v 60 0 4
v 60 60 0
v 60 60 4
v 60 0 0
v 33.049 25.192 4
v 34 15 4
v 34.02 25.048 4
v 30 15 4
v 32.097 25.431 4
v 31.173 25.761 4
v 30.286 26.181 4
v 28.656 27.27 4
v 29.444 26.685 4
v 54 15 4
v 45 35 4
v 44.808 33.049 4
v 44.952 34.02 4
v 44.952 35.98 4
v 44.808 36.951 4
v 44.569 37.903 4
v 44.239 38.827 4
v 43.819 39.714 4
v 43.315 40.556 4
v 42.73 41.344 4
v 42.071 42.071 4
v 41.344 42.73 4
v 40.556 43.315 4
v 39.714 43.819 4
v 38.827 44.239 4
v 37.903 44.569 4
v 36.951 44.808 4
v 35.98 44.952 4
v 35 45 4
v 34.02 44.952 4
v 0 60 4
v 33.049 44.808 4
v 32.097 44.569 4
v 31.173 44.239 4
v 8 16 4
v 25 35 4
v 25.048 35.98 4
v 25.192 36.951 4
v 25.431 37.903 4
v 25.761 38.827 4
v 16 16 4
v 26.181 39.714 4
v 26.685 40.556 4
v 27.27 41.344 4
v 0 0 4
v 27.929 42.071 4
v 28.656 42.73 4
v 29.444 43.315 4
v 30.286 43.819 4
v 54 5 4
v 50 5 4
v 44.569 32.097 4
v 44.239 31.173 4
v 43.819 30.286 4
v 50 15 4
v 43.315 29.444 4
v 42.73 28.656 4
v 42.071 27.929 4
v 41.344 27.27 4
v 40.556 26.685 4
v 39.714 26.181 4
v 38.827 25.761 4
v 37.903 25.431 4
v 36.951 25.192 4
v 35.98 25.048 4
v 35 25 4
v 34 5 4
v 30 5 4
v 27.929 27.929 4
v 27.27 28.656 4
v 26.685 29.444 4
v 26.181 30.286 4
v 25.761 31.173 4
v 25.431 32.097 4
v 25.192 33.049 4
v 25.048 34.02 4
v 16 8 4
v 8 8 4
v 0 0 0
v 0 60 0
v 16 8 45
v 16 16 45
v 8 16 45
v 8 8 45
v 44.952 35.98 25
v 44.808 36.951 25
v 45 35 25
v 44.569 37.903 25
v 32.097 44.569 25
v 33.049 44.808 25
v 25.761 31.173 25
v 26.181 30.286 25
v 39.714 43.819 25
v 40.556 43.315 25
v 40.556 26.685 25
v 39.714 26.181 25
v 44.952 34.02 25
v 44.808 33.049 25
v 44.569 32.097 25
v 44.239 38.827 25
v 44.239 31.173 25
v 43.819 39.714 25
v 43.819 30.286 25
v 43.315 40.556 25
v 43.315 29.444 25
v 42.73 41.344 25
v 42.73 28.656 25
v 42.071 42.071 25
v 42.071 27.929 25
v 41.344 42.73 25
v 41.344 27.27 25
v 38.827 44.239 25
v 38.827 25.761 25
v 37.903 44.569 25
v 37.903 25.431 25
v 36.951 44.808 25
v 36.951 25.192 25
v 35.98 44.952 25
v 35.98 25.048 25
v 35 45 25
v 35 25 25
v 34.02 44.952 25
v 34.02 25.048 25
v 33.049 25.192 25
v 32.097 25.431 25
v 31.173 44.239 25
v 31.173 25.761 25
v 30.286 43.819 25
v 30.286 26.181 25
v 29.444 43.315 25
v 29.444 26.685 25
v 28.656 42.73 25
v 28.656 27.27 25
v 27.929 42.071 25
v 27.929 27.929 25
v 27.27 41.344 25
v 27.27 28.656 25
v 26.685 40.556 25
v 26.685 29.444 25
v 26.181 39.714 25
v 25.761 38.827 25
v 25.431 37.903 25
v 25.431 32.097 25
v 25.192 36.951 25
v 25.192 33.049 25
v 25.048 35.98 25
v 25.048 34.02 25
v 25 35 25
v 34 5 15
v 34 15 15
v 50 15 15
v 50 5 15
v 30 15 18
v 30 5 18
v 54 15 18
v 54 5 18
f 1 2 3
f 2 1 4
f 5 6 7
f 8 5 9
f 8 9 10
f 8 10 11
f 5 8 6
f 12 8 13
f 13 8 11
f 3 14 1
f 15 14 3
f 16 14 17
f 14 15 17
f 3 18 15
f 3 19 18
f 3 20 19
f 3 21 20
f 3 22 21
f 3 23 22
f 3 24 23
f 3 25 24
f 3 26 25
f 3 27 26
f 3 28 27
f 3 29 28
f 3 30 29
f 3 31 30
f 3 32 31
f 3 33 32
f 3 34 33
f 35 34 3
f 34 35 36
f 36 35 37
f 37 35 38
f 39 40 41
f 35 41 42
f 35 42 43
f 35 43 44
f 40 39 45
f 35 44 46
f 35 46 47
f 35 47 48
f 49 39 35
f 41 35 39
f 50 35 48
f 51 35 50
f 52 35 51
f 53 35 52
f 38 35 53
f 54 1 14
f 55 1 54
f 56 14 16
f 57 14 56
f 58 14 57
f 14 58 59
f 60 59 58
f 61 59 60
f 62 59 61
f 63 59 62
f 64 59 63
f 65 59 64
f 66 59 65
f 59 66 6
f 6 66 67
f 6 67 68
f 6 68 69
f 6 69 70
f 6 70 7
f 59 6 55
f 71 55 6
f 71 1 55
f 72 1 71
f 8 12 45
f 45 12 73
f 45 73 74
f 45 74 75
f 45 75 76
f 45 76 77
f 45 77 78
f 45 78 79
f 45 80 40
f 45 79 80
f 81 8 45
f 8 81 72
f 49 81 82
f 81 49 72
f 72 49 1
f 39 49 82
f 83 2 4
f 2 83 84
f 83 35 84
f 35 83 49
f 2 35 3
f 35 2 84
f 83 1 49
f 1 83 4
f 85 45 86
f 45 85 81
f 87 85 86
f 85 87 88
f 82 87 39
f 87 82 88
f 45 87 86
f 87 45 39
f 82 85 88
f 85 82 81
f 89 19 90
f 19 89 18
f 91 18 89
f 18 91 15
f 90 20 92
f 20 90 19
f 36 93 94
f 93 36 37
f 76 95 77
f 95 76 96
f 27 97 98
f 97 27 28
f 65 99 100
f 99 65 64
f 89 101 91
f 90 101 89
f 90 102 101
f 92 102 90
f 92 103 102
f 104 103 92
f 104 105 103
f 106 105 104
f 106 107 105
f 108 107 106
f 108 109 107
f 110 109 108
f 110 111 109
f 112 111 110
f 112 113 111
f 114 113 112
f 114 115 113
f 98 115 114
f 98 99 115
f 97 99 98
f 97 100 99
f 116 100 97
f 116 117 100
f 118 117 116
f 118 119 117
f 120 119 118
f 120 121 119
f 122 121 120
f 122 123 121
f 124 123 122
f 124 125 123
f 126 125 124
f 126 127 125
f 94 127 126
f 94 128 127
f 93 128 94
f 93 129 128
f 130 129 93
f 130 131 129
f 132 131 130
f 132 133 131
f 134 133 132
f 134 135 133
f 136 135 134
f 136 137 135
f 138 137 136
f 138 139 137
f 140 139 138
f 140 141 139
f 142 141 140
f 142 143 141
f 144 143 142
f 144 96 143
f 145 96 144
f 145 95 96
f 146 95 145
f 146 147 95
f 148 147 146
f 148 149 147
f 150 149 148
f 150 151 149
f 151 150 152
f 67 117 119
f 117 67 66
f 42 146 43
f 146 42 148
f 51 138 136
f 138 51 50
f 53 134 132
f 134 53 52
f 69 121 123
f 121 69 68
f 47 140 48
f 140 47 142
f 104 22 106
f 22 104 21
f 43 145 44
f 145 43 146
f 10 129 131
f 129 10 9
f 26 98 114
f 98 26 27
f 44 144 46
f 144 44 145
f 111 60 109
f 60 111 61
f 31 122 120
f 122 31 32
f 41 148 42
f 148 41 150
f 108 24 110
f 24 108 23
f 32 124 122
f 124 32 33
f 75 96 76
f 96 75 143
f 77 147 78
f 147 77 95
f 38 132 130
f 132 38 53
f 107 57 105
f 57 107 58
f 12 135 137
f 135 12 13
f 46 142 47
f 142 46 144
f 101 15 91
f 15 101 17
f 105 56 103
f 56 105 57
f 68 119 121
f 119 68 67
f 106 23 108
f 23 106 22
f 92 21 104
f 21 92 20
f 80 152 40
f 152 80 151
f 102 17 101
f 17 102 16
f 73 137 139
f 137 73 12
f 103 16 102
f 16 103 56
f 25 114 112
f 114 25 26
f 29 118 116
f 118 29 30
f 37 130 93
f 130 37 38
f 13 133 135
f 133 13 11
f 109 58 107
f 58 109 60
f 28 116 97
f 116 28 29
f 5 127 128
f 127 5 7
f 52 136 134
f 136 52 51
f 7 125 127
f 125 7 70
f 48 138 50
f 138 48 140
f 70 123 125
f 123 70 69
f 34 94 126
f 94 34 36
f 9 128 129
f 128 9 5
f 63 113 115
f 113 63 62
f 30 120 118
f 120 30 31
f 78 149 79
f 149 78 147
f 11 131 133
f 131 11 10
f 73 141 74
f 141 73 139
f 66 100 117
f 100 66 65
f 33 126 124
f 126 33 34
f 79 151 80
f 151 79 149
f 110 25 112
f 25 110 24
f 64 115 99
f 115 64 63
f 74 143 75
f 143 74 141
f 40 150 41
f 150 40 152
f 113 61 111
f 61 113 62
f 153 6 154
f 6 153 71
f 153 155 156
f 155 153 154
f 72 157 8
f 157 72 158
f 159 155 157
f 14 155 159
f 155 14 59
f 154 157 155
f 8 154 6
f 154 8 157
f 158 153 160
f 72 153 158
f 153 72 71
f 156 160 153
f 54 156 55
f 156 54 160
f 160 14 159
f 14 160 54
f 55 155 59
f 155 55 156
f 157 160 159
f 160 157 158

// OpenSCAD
// base plate + thin tower (island heating) + overhang bridge
union(){
  cube([60,60,4]);
  translate([8,8,0]) cube([8,8,45]);          // thin spire -> short layer times
  translate([35,35,0]) cylinder(d=20,h=25,$fn=64);
  translate([30,5,0]) cube([4,10,15]); translate([50,5,0]) cube([4,10,15]);
  translate([30,5,15]) cube([24,10,3]);      // bridge
}
